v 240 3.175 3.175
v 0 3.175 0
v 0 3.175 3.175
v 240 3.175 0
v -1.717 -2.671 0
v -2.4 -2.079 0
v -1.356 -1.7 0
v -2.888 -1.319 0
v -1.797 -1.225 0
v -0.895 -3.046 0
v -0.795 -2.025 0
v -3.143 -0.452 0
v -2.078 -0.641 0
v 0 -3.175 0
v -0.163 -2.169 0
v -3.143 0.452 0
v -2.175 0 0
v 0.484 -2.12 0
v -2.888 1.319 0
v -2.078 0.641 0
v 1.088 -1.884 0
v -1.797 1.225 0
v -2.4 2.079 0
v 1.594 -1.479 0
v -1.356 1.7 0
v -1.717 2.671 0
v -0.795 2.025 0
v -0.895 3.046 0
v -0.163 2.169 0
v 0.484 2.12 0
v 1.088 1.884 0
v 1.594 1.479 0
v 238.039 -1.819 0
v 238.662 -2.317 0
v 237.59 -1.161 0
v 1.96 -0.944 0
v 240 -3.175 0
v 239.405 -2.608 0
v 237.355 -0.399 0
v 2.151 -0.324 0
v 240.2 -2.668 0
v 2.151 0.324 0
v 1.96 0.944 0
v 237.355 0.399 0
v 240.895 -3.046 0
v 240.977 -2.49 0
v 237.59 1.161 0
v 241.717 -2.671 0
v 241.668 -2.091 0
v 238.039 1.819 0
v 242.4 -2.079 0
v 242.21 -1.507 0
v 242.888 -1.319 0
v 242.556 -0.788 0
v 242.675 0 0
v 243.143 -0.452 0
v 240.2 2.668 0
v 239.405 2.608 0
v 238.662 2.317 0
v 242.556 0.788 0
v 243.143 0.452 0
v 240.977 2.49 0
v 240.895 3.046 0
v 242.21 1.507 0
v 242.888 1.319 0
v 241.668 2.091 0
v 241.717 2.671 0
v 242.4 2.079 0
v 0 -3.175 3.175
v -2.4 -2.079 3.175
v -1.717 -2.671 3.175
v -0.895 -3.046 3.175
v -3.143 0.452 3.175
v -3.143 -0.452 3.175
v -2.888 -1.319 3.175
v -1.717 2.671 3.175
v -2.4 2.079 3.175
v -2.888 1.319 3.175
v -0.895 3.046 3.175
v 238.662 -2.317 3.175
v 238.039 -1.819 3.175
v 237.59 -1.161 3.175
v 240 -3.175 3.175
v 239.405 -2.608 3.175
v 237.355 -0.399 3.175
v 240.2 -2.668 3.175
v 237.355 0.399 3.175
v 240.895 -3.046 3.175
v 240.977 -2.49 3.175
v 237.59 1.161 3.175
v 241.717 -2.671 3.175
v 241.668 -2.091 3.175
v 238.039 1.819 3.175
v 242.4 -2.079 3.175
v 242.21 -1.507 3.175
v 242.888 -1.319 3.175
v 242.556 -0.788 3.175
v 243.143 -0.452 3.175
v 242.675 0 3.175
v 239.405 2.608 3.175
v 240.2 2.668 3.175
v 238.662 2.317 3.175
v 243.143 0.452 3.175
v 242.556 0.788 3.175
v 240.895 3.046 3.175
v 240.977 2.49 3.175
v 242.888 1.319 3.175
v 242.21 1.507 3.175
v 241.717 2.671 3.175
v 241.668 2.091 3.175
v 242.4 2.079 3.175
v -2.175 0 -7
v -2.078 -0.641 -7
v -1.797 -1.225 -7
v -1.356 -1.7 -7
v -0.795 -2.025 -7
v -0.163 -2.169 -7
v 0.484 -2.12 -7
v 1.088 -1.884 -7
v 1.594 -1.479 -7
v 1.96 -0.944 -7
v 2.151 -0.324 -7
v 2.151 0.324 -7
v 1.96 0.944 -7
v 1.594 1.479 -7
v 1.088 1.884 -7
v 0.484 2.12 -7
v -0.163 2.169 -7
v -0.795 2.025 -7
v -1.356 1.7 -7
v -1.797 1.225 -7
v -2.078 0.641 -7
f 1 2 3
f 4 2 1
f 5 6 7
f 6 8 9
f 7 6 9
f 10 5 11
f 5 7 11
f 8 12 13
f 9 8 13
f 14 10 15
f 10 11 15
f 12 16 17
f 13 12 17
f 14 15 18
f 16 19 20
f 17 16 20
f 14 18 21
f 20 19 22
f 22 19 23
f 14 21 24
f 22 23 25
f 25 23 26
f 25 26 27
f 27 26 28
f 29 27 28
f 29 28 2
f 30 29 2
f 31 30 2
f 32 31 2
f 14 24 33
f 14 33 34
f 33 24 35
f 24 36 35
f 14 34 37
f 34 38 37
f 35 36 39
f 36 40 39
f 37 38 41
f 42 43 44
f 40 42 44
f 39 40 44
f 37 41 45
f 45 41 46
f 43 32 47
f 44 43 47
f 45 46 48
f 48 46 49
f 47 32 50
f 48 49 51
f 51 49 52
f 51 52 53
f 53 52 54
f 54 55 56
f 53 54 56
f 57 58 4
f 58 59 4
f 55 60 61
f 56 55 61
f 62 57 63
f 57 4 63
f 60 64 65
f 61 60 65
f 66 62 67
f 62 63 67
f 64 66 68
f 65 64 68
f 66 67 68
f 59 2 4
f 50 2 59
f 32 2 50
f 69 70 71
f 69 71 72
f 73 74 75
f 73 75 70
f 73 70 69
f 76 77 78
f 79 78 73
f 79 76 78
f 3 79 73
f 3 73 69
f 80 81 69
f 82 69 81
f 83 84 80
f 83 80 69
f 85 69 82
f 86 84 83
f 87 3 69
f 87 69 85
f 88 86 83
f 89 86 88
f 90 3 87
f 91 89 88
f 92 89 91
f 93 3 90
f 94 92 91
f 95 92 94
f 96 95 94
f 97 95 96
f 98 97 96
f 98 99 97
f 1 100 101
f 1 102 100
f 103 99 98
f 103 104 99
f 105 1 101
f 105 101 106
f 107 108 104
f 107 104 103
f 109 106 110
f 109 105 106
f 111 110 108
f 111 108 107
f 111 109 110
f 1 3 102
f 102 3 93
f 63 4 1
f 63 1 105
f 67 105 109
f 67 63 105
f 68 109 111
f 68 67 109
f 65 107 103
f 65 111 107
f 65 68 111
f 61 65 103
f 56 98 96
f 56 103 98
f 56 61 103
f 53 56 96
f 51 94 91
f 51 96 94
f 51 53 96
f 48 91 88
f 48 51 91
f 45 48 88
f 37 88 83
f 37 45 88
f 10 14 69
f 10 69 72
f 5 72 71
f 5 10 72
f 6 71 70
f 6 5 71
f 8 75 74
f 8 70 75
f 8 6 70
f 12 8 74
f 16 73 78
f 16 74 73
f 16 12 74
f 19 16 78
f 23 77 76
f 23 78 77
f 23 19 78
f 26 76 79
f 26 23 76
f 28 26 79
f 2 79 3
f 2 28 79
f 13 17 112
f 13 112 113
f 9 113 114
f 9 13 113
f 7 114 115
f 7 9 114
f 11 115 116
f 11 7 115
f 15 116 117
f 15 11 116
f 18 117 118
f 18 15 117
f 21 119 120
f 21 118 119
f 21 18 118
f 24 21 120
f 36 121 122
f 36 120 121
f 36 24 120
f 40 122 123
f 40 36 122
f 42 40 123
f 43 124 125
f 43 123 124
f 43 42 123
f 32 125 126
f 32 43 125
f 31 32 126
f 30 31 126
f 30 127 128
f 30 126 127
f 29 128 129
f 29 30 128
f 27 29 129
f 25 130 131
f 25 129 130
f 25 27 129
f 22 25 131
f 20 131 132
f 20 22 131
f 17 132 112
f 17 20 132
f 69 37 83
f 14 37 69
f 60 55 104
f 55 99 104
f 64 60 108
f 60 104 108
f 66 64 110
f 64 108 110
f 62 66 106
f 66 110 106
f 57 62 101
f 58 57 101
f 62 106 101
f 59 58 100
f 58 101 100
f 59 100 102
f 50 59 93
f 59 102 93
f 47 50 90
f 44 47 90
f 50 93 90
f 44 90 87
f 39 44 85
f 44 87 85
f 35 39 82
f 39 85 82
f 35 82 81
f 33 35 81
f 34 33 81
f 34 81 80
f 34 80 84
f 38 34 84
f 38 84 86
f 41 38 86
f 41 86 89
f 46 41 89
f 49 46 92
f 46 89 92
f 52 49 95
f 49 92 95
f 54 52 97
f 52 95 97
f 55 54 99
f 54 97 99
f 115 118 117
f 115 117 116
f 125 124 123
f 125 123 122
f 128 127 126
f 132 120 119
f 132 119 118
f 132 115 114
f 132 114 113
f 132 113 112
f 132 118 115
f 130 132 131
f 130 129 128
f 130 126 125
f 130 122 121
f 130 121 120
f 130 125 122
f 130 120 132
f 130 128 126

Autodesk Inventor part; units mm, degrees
ref_plane "YZ Plane" through (0, 0, 0) normal (1, 0, 0) x (0, 1, 0)
ref_plane "XZ Plane" through (0, 0, 0) normal (0, 1, 0) x (-1, 0, 0)
ref_plane "XY Plane" through (0, 0, 0) normal (0, 0, 1) x (1, 0, 0)
sketch "Boceto1" plane through (0, 0, 0) normal (0, 0, 1) x (1, 0, 0)
  arc A0 (0, 3.175) -> (0, -3.175) centre (0, 0) ccw
  arc A1 (240, -3.175) -> (240, 3.175) centre (240, 0) ccw
  line L0 (0, 3.175) -> (240, 3.175)
  line L1 (240, -3.175) -> (0, -3.175)
  dimension "d0" = 6.35
  dimension "d3" = 6.35
extrude "Extrusión1" add sketch "Boceto1" along normal blind 3.175
sketch "Boceto2" plane through (0, 0, 0) normal (0, 0, -1) x (-1, 0, 0)
  circle A0 centre (0, 0) radius 2.175
extrude "Extrusión2" add sketch "Boceto2" along normal blind 7
sketch "Boceto3" plane through (0, 0, 3.175) normal (0, 0, 1) x (1, 0, 0)
  arc A0 (240, -3.175) -> (240, 3.175) centre (240, 0) ccw projected
  circle A1 centre (240, 0) radius 3.175
  circle A2 centre (240, 0) radius 2.675
  point P0 (0, 0)
  dimension "d10" = 6.35
  dimension "d11" = 0.5
extrude "Extrusión3" cut sketch "Boceto3" against normal blind 5 contours A2
properties part number "eslabon_1" material "Aluminio 6061"
